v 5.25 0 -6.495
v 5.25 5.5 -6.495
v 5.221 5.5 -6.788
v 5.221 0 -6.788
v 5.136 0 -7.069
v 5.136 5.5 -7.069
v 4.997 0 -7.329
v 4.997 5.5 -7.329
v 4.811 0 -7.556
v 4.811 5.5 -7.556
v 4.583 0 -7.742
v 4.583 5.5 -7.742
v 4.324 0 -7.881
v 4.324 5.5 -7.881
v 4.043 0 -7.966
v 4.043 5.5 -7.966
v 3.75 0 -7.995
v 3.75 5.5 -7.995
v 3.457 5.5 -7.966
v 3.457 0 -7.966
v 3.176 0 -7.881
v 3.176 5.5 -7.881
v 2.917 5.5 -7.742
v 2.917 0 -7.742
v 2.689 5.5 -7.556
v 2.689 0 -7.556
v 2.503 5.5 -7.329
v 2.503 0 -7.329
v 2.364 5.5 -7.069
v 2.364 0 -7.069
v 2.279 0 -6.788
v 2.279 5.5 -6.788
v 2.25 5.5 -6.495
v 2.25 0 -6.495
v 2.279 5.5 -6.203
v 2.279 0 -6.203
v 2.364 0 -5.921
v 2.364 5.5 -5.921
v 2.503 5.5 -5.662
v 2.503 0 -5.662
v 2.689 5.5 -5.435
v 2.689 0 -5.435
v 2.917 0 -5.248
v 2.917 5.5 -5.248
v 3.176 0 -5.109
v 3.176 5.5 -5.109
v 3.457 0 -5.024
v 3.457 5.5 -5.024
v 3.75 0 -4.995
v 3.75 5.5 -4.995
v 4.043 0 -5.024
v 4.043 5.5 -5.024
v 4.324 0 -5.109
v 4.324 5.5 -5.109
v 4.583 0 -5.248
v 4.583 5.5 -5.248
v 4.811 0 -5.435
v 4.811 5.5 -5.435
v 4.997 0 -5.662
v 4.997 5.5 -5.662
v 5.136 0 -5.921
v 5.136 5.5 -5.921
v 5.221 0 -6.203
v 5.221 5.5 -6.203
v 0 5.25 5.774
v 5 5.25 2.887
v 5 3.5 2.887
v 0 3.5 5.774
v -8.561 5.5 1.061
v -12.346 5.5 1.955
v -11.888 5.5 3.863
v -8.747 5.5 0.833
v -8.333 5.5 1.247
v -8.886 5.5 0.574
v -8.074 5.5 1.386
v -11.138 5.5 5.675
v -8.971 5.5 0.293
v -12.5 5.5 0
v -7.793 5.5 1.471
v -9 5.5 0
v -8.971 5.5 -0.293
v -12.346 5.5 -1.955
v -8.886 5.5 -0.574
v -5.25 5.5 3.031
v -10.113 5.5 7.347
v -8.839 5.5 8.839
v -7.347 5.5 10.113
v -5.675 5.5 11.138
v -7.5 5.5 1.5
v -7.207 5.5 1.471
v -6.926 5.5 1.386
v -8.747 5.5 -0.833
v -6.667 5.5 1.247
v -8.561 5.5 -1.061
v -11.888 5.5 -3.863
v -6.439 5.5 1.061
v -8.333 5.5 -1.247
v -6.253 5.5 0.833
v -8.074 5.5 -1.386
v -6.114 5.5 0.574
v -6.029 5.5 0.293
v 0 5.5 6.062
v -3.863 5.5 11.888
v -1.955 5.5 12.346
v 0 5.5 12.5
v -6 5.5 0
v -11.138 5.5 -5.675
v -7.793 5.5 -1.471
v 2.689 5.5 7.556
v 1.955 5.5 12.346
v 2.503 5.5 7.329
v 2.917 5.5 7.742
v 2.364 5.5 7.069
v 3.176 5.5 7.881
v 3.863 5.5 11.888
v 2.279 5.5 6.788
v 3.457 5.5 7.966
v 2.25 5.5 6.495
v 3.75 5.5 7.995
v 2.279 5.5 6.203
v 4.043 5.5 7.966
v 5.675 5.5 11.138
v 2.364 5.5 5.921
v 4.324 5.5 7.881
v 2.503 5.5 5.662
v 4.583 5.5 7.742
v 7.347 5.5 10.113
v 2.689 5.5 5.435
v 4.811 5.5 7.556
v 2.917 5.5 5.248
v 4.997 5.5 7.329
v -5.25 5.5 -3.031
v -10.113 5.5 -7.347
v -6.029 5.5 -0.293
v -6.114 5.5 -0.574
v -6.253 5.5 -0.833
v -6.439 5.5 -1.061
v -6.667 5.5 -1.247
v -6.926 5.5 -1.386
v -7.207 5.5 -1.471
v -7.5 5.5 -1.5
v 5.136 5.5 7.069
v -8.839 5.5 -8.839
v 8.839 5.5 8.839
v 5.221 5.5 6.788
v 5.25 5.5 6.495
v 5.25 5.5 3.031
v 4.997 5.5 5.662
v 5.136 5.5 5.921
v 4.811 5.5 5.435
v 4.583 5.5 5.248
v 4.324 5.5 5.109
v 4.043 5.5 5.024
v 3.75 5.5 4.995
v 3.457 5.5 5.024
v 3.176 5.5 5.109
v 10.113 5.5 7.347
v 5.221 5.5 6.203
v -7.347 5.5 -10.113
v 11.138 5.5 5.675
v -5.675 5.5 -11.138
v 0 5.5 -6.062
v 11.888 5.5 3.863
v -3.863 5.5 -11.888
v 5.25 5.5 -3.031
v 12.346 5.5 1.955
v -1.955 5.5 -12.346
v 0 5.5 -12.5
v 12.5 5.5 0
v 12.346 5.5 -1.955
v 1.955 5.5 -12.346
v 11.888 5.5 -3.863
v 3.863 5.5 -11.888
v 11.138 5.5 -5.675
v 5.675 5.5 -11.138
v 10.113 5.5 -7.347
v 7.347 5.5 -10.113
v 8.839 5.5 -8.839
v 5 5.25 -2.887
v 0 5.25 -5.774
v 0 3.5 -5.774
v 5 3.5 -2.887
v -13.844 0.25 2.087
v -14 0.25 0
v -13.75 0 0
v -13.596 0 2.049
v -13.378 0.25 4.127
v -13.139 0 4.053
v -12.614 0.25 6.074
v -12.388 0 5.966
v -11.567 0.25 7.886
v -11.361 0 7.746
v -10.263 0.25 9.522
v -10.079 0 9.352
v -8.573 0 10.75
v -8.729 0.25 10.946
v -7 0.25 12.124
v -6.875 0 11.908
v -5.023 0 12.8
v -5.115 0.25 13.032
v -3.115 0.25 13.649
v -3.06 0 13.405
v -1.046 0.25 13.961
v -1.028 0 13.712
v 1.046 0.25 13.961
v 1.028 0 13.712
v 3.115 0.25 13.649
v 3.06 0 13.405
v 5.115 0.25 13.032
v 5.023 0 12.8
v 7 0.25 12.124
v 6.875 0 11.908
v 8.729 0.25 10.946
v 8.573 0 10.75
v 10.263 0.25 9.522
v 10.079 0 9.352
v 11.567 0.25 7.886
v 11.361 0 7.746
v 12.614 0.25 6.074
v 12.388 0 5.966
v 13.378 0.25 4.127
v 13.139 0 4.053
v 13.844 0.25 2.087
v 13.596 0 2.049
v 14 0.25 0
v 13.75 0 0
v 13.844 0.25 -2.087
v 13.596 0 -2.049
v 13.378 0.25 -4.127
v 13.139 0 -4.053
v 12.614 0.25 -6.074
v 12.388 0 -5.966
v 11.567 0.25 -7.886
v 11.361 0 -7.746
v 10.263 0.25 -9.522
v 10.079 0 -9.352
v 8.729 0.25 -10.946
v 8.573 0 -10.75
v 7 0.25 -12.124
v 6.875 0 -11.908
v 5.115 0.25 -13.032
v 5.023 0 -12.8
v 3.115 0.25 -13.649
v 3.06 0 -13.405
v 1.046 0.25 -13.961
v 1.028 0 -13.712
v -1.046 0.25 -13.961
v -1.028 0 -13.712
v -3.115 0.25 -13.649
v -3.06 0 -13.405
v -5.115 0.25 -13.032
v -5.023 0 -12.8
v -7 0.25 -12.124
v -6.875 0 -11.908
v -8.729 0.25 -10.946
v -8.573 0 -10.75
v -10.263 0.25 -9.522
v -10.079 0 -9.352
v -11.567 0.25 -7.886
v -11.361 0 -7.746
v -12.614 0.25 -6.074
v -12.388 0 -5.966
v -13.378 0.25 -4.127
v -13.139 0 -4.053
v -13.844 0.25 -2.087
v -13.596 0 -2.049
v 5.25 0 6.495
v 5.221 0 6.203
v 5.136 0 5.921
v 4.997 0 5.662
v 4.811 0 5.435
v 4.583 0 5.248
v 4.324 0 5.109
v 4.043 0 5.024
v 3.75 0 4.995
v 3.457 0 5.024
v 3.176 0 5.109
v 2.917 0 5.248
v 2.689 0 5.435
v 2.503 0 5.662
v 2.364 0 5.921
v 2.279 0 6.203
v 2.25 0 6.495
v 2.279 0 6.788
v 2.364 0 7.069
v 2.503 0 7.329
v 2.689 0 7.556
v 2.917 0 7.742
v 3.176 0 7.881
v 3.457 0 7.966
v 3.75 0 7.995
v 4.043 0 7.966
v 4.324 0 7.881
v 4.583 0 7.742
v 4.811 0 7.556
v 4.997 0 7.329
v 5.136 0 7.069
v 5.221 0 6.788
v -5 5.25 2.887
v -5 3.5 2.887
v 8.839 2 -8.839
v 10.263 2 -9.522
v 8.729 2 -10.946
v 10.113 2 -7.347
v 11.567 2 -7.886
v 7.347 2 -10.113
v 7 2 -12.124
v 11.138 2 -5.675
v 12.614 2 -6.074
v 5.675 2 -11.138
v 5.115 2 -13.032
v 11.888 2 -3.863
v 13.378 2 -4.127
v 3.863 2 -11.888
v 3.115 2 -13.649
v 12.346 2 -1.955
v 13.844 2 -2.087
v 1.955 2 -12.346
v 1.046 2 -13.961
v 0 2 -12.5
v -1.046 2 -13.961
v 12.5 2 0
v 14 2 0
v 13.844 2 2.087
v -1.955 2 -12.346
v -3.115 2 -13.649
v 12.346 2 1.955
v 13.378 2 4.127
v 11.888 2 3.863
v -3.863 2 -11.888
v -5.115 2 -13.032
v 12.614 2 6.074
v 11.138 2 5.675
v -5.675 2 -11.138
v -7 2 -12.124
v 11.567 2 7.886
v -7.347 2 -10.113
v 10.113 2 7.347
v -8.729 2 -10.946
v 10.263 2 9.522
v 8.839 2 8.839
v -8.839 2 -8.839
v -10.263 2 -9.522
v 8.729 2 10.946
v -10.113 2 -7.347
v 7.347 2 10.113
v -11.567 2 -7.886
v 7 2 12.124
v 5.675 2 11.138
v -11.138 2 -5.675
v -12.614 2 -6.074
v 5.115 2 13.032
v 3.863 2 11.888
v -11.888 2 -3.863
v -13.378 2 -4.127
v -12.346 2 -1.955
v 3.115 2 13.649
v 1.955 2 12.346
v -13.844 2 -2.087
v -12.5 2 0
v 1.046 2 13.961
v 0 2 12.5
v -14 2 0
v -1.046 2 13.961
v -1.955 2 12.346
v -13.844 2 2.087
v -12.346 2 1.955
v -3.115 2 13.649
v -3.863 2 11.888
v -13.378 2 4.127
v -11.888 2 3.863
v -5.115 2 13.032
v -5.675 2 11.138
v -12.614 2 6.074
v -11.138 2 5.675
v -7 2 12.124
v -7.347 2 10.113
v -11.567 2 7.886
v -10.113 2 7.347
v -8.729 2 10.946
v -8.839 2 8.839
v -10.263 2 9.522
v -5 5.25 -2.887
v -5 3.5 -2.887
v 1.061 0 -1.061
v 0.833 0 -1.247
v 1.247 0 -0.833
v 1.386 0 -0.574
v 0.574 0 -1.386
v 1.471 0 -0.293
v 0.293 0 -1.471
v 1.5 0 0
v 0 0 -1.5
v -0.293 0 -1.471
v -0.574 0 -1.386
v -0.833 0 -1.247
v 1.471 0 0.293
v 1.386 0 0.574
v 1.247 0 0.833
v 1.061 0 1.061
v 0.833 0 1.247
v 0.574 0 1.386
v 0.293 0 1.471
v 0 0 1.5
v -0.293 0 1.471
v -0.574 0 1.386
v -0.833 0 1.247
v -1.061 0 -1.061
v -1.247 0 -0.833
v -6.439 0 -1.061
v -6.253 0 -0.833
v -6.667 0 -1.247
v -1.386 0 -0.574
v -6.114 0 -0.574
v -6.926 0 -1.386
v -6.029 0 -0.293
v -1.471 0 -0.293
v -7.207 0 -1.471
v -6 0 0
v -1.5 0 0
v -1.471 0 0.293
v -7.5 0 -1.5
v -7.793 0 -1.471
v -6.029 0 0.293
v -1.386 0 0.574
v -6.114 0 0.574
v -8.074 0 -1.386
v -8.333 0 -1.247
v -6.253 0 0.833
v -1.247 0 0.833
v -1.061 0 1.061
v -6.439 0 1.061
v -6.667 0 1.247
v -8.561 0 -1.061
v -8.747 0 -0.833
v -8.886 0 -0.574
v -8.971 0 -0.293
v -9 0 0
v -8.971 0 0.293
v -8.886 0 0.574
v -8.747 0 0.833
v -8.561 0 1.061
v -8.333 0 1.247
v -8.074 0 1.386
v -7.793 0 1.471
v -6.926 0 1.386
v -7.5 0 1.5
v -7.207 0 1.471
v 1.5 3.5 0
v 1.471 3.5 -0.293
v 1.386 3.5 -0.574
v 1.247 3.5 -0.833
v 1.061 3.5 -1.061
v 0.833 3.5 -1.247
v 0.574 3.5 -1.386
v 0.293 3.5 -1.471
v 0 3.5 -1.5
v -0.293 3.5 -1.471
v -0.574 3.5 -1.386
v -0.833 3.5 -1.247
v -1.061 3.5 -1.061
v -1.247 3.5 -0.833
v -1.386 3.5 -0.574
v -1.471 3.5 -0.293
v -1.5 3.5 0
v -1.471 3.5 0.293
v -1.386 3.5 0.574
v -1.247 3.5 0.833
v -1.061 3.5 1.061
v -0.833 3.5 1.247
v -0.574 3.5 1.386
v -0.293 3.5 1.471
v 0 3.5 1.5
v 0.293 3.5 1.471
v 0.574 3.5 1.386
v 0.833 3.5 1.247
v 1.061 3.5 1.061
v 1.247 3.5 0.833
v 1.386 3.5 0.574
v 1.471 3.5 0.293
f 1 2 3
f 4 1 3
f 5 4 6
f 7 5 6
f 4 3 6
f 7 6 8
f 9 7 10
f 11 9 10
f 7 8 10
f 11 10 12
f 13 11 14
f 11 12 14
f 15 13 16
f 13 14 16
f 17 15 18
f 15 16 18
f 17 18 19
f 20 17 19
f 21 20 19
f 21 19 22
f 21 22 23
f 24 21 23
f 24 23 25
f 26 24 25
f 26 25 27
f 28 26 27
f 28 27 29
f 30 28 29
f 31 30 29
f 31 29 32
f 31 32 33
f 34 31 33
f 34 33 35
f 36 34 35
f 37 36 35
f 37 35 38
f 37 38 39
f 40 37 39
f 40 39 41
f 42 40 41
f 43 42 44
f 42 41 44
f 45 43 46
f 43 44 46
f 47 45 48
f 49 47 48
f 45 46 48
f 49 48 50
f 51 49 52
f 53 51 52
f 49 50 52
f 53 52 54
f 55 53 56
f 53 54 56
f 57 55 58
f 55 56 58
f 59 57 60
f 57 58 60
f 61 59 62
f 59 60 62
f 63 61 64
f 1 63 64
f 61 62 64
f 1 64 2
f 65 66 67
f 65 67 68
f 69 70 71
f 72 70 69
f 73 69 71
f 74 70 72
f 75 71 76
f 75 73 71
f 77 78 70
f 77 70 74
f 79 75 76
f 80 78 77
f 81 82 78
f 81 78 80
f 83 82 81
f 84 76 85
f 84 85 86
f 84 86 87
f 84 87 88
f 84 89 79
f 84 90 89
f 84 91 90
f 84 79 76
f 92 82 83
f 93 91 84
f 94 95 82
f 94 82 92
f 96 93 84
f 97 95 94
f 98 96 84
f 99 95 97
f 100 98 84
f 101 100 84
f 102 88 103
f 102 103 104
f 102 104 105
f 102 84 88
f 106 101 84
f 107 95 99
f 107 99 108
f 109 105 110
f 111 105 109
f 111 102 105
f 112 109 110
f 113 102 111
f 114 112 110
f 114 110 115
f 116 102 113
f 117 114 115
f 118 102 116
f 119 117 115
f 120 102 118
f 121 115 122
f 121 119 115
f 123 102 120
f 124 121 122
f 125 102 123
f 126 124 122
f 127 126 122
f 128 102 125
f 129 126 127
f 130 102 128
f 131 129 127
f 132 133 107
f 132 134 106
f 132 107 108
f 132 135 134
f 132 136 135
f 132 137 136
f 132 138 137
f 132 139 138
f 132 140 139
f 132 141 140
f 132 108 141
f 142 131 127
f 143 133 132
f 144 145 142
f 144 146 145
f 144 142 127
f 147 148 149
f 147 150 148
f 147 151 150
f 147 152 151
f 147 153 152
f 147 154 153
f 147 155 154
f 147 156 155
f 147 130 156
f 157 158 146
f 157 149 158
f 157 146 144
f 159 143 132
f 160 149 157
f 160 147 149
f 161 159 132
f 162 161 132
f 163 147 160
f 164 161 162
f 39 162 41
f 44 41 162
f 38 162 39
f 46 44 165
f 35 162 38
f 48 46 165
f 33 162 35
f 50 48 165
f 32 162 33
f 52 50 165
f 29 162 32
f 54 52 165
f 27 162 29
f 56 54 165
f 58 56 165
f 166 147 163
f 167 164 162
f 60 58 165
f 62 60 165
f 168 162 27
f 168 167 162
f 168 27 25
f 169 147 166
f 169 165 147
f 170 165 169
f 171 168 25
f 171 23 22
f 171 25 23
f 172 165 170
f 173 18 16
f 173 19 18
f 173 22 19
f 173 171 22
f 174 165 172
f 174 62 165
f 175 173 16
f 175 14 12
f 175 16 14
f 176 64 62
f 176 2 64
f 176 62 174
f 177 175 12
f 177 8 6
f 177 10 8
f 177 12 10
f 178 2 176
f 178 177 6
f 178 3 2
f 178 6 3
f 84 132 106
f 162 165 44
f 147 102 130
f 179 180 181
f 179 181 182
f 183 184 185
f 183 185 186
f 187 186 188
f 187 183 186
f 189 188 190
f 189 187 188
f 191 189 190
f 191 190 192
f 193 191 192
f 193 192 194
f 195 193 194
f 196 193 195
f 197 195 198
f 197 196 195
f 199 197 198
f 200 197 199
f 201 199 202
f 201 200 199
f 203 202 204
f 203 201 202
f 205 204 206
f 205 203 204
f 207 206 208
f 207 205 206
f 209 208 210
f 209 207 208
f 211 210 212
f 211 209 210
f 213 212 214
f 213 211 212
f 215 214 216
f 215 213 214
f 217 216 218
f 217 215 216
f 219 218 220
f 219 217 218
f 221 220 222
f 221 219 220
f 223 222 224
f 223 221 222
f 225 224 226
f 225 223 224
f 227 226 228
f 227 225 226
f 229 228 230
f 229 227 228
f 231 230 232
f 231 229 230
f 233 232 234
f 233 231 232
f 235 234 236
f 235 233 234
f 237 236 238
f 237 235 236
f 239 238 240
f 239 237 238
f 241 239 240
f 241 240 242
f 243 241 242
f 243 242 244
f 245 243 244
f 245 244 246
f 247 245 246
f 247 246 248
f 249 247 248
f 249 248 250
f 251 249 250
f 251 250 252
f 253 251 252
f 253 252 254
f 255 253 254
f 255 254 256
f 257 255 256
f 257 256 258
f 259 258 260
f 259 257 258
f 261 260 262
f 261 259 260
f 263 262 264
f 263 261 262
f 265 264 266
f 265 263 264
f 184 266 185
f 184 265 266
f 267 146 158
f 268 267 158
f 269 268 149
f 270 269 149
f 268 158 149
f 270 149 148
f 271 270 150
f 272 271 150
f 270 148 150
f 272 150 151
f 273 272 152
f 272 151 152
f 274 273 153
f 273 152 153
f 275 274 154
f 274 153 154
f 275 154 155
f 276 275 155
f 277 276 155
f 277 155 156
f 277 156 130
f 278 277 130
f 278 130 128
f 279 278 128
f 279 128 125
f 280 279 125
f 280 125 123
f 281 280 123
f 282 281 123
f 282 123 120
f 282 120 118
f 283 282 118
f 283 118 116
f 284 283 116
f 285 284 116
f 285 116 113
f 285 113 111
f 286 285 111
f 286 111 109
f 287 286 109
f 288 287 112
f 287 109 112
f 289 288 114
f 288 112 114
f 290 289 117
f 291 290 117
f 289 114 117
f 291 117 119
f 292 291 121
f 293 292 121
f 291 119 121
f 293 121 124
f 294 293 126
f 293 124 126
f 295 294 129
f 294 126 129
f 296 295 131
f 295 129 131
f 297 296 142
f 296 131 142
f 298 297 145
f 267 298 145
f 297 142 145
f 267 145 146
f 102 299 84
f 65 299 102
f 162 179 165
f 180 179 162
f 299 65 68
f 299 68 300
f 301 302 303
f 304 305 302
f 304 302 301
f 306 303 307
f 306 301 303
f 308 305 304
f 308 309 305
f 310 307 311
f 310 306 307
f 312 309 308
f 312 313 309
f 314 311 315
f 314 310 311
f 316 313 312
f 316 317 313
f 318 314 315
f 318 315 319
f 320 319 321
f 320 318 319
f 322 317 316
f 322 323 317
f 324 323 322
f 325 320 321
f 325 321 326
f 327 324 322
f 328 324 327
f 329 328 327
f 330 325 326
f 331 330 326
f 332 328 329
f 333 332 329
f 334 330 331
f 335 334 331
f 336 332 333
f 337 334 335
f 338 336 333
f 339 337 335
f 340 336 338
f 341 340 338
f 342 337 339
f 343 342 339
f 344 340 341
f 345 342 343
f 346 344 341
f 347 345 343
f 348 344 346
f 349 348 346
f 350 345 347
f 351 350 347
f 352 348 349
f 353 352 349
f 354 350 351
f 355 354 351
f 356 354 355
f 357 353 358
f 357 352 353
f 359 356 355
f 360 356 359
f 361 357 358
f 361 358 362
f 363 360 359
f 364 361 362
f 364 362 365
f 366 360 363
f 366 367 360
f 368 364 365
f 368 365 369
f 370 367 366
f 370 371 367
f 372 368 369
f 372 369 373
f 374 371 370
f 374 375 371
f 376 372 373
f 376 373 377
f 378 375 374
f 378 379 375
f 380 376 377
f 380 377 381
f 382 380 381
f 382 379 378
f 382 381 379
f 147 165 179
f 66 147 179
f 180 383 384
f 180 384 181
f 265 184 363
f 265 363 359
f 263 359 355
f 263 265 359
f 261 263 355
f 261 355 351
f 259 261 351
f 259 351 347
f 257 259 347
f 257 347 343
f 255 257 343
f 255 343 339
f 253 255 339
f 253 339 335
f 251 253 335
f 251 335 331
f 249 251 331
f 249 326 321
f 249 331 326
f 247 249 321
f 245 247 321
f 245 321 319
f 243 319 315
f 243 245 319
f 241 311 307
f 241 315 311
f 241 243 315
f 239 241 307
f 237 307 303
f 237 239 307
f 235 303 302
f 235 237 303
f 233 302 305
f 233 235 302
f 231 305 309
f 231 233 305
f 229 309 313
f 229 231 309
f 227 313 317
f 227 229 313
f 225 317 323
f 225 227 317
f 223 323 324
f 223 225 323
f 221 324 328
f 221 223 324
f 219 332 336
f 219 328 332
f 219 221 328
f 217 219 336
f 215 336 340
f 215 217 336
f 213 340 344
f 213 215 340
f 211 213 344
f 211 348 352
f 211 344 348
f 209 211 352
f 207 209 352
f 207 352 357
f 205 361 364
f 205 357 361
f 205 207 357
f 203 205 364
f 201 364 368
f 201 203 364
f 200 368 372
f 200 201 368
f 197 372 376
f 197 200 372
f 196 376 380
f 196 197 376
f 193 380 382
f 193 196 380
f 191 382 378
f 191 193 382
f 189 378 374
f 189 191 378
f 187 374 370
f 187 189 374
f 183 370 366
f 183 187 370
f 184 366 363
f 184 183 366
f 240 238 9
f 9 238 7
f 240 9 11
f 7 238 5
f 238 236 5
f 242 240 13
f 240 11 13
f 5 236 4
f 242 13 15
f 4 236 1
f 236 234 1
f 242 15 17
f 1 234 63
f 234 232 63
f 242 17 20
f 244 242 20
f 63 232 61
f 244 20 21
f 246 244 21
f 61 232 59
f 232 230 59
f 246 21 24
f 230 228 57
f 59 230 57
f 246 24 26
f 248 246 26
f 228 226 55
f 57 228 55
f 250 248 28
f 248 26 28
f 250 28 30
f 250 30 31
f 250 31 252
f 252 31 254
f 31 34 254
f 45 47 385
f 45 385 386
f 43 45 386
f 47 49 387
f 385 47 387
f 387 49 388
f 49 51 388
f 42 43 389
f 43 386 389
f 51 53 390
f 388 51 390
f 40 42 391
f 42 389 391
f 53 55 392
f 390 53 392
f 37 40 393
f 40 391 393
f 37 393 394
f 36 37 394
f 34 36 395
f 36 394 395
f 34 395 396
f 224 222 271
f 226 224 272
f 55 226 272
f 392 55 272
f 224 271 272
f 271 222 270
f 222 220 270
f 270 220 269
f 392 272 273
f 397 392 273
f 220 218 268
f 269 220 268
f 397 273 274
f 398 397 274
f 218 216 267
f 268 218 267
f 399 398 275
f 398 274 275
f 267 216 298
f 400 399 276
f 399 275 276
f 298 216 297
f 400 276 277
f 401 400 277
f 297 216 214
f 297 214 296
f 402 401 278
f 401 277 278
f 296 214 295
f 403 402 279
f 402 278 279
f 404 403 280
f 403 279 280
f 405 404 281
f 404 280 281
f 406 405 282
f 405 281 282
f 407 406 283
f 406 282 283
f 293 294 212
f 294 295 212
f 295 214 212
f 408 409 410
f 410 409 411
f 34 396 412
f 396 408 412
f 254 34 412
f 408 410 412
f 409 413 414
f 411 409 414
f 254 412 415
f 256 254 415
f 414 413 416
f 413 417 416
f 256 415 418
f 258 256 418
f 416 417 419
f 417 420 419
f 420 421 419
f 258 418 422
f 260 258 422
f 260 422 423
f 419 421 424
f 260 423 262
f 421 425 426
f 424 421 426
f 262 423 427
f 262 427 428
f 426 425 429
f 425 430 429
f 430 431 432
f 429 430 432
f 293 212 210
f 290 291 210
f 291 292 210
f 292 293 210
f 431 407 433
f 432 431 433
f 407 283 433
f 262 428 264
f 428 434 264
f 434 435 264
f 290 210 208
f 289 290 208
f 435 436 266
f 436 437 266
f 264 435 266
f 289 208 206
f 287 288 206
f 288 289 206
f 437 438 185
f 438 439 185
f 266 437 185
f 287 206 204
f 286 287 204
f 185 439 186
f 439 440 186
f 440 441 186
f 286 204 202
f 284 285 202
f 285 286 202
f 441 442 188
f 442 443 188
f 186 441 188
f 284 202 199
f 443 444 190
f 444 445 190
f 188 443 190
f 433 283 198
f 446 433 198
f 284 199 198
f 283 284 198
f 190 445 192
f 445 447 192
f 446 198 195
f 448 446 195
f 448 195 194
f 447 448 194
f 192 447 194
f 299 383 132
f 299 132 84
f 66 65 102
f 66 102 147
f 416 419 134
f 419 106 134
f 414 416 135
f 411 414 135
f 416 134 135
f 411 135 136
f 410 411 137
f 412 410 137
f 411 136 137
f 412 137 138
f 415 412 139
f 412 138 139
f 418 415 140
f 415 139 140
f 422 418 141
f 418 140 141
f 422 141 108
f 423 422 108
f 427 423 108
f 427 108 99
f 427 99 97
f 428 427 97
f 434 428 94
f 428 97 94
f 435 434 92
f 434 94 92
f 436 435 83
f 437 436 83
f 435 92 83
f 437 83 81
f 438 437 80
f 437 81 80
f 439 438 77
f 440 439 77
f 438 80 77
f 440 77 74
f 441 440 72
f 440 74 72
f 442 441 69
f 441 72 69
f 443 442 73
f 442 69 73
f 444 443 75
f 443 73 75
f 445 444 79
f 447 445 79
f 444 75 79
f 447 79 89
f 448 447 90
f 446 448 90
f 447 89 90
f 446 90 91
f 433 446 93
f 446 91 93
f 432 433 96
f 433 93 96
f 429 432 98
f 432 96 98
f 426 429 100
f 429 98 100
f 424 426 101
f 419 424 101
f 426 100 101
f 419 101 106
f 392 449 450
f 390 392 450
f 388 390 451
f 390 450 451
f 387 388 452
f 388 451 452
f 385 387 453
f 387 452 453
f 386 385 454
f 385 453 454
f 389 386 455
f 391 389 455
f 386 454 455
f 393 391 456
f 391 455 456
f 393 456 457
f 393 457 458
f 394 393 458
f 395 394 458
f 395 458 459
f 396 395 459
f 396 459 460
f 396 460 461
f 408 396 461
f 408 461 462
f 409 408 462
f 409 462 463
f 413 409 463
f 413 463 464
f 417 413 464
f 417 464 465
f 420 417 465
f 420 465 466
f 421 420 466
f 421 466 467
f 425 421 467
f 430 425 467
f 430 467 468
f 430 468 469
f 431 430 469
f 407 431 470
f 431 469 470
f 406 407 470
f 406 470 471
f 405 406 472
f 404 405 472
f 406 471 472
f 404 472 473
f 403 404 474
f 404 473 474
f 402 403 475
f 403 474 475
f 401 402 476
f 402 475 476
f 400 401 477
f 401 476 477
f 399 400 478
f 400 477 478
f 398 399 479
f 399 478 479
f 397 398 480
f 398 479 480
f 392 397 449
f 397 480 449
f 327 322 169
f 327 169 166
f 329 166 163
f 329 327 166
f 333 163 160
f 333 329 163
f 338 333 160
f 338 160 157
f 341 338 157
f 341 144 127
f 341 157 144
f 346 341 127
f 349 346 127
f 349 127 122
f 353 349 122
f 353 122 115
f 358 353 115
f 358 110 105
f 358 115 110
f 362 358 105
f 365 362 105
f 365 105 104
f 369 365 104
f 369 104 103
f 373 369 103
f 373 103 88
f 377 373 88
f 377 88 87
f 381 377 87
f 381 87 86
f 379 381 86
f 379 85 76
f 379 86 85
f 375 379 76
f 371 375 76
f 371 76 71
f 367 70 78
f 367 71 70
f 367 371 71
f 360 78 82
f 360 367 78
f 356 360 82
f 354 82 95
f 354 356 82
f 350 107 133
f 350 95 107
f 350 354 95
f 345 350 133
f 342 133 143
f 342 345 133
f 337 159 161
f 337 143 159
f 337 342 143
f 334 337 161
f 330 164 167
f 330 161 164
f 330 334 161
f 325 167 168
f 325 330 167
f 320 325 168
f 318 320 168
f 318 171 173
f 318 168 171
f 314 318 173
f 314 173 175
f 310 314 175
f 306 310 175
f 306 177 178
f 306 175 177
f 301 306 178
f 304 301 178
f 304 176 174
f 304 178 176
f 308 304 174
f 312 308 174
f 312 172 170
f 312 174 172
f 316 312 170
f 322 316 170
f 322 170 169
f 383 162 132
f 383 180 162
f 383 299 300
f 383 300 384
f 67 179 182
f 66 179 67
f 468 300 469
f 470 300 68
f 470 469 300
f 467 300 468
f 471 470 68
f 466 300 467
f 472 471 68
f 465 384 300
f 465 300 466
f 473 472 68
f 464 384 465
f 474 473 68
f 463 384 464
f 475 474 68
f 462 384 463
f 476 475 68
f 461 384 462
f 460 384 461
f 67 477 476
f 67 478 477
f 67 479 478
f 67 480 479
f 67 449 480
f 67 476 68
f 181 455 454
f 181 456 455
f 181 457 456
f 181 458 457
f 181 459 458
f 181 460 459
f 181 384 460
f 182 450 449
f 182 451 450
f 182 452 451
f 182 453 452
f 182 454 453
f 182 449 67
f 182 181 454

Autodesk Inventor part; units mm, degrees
ref_plane "YZ Plane" through (0, 0, 0) normal (1, 0, 0) x (0, 1, 0)
ref_plane "XZ Plane" through (0, 0, 0) normal (0, 1, 0) x (-1, 0, 0)
ref_plane "XY Plane" through (0, 0, 0) normal (0, 0, 1) x (1, 0, 0)
sketch "Sketch1" plane through (0, 0, 0) normal (0, 1, 0) x (-1, 0, 0)
  circle A0 centre (0, 0) radius 14
  dimension "d0" = 28
extrude "Extrusion1" add sketch "Sketch1" along normal blind 2
sketch "Sketch2" plane through (0, 2, 0) normal (0, 1, 0) x (1, 0, 0)
  circle A0 centre (0, 0) radius 12.5
  dimension "d3" = 25
extrude "Extrusion2" add sketch "Sketch2" along normal blind 3.5
sketch "Sketch3" plane through (0, 5.5, 0) normal (0, 1, 0) x (1, 0, 0)
  line L0 (5, -2.8868) -> (0, -5.7735)
  line L1 (0, -5.7735) -> (-5, -2.8868)
  line L2 (-5, -2.8868) -> (-5, 2.8868)
  line L3 (-5, 2.8868) -> (0, 5.7735)
  line L4 (0, 5.7735) -> (5, 2.8868)
  line L5 (5, 2.8868) -> (5, -2.8868)
  point P0 (0, 0)
  point P1 (0, 0)
  dimension "d6" = 10
extrude "Extrusion3" cut sketch "Sketch3" against normal blind 2
sketch "Sketch4" plane through (0, 5.5, 0) normal (0, 1, 0) x (1, 0, 0)
  circle A0 centre (0, 0) radius 1.5
  circle A1 centre (0, 0) radius 7.5 construction
  circle A2 centre (-7.5, 0) radius 1.5
  circle A3 centre (-3.75, -6.4952) radius 1.5
  circle A4 centre (3.75, -6.4952) radius 1.5
  circle A5 centre (7.5, 0) radius 1.5
  circle A6 centre (3.75, 6.4952) radius 1.5
  circle A7 centre (-3.75, 6.4952) radius 1.5
  dimension "d13" = 15
  dimension "d12" = 3
  dimension "d14" = 3
  dimension "d17" = 360
extrude "Extrusion4" cut sketch "Sketch4" against normal through all contours A0 | A2 | A4 | A6
chamfer "Chamfer2" distance 0.25 angle 45 1 edges at (14, 0, 0)
chamfer "Chamfer3" distance 0.25 angle 45 6 edges at (-5, 5.5, 0) (-2.5, 5.5, 4.3301) (2.5, 5.5, 4.3301) (5, 5.5, 0) (2.5, 5.5, -4.3301) (-2.5, 5.5, -4.3301)
properties part number "Shaft2_Joint2" material "ABS Plastic"
